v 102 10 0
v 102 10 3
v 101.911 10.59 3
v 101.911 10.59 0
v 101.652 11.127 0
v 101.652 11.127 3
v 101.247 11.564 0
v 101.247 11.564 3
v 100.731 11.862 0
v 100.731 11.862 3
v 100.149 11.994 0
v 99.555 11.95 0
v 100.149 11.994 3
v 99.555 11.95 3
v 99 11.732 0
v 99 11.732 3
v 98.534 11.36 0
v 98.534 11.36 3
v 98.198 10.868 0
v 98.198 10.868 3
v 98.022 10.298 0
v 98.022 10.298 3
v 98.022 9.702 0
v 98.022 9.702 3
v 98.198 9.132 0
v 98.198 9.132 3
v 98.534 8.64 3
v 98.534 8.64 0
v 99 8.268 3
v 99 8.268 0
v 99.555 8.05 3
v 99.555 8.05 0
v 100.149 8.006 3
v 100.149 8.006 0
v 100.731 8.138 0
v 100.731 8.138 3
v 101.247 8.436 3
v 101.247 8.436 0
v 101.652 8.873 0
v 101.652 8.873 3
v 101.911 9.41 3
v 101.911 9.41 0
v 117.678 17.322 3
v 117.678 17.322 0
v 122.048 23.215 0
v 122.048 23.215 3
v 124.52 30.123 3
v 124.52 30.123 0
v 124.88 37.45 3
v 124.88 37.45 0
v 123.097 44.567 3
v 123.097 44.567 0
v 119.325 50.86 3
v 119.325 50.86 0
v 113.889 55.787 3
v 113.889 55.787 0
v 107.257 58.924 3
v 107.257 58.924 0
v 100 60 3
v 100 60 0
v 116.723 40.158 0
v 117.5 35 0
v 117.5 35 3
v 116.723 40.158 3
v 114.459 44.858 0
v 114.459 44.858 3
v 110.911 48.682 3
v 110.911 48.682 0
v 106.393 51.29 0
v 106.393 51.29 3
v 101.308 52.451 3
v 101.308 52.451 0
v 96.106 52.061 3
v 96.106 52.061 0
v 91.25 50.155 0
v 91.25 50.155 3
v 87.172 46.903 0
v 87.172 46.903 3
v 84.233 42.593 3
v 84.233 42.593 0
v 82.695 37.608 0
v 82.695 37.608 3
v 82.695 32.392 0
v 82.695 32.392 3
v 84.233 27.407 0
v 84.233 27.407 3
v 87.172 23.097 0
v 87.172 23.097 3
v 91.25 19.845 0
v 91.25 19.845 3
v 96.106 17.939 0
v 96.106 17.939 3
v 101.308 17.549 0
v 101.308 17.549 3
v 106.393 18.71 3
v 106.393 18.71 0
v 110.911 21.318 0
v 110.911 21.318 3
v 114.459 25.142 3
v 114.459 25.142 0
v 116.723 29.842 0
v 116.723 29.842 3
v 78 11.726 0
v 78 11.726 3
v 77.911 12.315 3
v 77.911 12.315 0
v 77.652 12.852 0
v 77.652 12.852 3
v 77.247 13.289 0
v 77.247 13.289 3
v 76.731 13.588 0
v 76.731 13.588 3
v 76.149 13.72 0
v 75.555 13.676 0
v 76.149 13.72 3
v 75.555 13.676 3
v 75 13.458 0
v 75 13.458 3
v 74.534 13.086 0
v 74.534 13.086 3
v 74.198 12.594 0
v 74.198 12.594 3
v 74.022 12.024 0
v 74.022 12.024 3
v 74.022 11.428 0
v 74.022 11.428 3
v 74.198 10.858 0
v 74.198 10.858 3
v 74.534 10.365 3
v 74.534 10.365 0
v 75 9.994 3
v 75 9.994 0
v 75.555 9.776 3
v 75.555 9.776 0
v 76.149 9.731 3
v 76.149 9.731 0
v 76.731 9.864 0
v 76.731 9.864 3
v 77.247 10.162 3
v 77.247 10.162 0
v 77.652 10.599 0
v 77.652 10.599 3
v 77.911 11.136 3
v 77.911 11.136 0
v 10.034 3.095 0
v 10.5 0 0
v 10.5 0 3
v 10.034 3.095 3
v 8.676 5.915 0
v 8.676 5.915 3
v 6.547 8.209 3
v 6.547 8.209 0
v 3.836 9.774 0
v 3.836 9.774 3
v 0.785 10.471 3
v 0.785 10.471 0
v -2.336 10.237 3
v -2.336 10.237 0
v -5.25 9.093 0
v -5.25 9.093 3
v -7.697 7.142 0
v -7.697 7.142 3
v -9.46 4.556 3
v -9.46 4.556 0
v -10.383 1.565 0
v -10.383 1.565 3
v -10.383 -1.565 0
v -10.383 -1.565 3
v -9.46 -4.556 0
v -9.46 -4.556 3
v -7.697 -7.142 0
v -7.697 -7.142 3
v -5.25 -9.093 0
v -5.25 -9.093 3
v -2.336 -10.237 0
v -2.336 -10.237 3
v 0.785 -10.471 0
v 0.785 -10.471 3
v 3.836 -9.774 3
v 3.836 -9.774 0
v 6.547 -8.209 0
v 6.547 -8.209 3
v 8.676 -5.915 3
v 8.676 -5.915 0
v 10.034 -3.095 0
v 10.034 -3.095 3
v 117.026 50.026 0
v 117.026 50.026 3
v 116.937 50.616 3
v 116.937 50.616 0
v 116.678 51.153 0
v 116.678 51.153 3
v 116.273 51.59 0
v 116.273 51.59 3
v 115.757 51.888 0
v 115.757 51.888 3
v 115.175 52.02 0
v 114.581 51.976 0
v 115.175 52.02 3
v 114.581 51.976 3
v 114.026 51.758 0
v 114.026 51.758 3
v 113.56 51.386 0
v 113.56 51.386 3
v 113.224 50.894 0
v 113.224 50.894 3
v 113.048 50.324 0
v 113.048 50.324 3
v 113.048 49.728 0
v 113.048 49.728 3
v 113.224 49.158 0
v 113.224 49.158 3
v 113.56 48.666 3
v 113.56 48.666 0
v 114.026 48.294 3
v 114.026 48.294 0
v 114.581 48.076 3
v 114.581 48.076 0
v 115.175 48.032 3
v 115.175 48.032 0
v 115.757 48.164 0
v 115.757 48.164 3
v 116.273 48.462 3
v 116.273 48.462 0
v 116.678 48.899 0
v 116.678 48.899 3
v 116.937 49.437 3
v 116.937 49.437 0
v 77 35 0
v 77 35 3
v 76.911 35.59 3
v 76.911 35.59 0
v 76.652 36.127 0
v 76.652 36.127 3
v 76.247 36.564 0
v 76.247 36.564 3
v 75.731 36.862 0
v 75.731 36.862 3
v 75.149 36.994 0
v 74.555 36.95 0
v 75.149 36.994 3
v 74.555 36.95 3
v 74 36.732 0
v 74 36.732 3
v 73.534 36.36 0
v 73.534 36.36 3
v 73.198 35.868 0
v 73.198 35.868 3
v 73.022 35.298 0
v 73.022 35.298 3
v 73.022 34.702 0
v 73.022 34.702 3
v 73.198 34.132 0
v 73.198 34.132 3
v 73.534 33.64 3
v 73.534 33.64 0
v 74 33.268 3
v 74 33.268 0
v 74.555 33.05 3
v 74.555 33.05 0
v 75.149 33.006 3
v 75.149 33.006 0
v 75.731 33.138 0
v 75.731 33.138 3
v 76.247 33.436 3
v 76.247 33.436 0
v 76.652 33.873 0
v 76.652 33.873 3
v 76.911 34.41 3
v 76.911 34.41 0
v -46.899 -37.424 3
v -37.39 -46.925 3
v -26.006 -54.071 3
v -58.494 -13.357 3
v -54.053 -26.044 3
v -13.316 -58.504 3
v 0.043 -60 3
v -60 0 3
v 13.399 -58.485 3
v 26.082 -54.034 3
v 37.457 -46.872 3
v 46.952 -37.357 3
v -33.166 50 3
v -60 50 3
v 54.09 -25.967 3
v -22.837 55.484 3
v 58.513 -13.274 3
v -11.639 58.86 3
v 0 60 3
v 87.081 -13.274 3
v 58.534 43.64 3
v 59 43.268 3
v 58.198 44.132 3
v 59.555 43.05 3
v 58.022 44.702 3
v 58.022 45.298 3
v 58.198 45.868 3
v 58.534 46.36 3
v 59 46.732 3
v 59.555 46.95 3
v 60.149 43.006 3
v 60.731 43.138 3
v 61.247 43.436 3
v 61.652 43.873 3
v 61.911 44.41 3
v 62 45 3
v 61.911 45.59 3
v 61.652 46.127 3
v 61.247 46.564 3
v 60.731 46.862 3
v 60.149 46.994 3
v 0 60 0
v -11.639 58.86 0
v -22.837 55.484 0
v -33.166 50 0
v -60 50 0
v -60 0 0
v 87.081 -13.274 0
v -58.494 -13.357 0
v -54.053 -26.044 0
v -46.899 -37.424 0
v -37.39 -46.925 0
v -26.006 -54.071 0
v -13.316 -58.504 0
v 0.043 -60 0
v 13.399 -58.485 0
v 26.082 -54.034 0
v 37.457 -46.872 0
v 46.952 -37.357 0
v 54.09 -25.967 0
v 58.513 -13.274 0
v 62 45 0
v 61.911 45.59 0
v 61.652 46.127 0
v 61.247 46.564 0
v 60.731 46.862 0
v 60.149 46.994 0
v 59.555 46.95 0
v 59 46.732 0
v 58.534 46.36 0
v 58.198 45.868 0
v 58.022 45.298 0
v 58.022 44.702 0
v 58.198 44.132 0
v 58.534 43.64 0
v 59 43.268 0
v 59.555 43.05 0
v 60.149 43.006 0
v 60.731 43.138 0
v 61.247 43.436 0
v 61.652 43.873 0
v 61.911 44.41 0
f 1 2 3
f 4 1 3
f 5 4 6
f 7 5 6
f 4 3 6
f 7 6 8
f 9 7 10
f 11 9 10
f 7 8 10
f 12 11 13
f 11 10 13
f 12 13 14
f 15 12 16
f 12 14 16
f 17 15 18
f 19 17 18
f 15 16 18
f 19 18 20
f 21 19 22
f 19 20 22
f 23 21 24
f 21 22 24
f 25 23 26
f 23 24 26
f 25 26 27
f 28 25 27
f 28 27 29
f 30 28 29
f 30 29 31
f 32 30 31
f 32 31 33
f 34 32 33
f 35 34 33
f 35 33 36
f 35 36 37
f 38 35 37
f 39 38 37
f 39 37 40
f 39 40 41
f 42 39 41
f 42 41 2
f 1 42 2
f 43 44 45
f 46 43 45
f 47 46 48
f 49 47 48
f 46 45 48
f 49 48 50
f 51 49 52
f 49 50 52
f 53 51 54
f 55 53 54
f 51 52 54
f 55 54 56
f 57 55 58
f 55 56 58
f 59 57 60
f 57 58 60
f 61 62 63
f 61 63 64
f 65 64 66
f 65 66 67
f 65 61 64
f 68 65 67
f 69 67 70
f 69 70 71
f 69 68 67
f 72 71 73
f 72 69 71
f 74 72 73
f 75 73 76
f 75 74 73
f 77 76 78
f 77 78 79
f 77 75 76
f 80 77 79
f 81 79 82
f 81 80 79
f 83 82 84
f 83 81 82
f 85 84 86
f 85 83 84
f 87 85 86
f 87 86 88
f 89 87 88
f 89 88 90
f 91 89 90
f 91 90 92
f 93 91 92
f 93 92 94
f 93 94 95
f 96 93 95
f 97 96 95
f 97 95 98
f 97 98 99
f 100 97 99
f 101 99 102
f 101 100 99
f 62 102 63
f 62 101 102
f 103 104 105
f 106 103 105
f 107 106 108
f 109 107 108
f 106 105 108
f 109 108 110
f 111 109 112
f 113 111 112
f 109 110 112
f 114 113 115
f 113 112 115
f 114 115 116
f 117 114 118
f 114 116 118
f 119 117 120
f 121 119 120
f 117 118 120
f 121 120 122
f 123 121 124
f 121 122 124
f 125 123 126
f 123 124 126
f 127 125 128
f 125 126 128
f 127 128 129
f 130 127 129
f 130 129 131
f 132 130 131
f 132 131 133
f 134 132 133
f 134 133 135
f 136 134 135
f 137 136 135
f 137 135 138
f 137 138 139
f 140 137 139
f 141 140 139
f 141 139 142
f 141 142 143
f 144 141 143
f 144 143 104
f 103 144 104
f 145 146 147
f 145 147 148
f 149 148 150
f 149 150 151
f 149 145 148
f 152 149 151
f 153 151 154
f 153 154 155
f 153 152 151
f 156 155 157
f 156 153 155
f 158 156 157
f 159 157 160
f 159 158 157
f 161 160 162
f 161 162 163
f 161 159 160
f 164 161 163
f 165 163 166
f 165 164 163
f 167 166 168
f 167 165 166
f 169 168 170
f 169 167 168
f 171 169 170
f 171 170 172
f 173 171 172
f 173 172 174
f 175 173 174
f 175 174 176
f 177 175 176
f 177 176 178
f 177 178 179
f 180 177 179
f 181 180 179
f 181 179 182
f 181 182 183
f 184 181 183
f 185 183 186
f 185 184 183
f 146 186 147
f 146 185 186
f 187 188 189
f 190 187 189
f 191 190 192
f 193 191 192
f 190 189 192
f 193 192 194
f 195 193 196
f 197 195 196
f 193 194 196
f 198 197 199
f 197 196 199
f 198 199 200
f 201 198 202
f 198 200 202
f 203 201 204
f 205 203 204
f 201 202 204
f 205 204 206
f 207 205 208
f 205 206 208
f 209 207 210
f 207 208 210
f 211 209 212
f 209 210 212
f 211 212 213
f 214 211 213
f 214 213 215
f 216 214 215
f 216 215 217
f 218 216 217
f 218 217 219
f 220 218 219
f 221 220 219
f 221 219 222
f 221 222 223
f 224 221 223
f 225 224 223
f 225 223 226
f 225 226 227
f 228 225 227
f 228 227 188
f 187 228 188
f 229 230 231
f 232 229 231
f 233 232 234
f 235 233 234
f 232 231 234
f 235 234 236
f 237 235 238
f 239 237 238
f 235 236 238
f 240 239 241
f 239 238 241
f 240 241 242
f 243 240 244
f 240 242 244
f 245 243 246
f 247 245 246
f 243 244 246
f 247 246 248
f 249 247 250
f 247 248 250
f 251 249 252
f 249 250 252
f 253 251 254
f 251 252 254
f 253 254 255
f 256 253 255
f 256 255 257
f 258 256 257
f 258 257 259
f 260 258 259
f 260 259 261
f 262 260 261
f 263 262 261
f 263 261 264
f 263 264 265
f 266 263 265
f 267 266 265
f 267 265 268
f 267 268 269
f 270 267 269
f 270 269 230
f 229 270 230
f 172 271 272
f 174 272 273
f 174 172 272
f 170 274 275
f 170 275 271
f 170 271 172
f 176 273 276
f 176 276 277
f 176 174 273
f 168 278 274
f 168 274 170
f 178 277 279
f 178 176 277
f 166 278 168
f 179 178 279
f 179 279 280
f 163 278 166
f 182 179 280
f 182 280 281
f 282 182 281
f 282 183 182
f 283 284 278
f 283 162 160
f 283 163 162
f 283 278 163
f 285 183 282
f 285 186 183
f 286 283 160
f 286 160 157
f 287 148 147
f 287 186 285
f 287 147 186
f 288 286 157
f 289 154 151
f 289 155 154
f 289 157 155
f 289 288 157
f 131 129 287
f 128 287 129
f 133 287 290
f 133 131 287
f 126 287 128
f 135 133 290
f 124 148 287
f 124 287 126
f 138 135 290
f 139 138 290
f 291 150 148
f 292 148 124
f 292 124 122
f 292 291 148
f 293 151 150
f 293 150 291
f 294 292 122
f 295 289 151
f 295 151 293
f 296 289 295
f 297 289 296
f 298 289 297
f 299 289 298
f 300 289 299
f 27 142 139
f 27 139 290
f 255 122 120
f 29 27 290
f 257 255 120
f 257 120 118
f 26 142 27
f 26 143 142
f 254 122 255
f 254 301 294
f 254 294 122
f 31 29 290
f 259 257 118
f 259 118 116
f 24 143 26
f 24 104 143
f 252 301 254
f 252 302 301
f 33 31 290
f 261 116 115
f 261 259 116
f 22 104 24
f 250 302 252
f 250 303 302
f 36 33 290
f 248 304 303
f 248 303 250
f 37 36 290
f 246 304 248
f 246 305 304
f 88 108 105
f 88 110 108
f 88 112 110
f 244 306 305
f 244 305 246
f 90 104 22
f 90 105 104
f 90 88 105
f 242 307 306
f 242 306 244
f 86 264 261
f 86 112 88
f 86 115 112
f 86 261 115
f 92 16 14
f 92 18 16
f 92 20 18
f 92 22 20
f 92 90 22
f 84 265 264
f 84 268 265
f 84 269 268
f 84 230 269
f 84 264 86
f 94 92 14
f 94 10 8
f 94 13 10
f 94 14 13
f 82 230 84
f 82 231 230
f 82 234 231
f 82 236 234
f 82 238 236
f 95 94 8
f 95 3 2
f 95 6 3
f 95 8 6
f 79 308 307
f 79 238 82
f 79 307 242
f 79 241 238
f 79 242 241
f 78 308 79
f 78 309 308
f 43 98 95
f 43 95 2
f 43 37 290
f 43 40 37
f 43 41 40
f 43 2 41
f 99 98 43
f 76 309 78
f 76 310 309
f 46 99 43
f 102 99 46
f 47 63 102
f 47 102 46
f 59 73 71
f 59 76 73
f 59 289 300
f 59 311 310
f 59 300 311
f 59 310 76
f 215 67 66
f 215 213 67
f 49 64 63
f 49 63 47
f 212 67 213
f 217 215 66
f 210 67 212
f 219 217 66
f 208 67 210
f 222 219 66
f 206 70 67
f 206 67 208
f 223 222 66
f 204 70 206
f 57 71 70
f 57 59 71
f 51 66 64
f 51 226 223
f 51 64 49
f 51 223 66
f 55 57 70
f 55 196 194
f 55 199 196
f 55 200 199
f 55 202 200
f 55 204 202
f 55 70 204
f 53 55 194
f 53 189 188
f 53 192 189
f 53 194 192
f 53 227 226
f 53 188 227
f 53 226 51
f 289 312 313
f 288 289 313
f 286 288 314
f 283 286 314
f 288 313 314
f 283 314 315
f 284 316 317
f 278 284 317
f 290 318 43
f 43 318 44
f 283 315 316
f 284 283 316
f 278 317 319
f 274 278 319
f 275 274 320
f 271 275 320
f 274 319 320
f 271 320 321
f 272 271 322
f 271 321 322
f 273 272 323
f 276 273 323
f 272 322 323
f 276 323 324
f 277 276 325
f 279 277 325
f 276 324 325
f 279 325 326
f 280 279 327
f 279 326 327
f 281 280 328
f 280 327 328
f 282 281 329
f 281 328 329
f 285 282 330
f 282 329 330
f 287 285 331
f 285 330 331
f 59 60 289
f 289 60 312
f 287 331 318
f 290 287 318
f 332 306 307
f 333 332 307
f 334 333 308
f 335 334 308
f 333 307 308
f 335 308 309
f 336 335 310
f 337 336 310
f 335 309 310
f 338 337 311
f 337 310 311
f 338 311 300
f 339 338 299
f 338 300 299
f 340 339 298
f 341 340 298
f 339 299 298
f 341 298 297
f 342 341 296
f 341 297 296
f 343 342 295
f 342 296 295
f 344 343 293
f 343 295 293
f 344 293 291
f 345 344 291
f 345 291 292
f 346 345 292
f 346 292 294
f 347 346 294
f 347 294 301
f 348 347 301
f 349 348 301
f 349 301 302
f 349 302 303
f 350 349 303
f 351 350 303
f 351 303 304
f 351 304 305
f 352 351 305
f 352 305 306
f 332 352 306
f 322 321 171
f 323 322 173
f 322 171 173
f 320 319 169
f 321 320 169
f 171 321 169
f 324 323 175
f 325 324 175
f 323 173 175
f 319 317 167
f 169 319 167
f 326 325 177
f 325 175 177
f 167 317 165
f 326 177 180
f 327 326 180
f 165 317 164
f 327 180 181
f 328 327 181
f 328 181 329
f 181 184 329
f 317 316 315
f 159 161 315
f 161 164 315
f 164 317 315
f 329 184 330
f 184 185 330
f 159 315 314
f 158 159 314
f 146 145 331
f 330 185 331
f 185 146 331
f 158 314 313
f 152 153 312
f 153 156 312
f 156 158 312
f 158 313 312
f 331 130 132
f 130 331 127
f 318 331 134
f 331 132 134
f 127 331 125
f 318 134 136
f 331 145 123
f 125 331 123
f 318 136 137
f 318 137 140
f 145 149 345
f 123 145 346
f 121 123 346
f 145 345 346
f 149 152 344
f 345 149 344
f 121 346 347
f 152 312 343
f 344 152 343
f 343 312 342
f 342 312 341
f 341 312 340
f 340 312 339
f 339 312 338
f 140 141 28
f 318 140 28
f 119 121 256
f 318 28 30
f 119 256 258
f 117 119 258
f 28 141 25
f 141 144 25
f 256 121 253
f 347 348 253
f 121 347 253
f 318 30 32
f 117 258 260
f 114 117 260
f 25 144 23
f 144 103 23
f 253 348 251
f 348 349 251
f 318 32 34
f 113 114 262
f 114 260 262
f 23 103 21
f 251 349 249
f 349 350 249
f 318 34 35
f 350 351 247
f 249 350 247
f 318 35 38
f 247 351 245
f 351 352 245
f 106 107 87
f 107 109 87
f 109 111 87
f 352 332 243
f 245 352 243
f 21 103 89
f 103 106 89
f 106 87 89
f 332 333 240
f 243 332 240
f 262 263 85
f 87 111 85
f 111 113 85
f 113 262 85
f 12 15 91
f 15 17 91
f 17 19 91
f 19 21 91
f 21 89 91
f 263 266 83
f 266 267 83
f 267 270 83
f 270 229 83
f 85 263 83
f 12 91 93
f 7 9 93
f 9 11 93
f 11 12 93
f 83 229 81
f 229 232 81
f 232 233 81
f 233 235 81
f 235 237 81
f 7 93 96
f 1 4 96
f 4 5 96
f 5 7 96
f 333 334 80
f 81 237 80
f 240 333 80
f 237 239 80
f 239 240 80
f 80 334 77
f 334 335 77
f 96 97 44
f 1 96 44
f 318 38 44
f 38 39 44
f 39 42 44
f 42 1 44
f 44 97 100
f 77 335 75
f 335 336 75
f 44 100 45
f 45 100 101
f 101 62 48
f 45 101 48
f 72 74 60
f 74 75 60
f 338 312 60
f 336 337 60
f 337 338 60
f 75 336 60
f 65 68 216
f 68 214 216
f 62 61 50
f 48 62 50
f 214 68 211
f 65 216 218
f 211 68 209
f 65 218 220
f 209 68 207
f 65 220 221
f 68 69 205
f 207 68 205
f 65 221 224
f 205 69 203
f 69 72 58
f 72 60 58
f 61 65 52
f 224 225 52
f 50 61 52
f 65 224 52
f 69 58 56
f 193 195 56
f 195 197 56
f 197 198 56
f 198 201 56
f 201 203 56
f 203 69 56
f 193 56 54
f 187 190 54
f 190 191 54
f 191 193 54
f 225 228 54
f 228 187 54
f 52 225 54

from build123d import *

# Parameters (mm, degrees)
SKETCH1_R           = 10.5
SKETCH1_R_2         = 17.5
BOSS_EXTRUDE1_DEPTH = 3
CUT_EXTRUDE1_REACH  = 140.687
SKETCH2_R           = 2
CUT_EXTRUDE2_REACH  = 140.687
SKETCH3_R           = 2


with BuildPart() as part:
    # Sketch1 → Boss-Extrude1 (new body)
    # profile 1 of 2: a face of its own
    with BuildSketch(Plane.XY):
        with BuildLine():
            ThreePointArc((-60, 0), (-52.867640737, 28.372743309), (-33.166247904, 50))
            Line((-33.166247904, 50), (-60, 50))
            Line((-60, 50), (-60, 0))
        make_face()
    # profile 2 of 2: a face of its own
    with BuildSketch(Plane.XY):
        with BuildLine():
            ThreePointArc((0, 60), (-17.320508076, 57.445626465), (-33.166247904, 50))
            ThreePointArc((-33.166247904, 50), (-52.867640737, 28.372743309), (-60, 0))
            ThreePointArc((-60, 0), (-6.678621673, -59.627141576), (58.513200418, -13.274237334))
            Line((58.513200418, -13.274237334), (87.081101726, -13.274237334))
            Line((87.081101726, -13.274237334), (117.67766953, 17.32233047))
            ThreePointArc((117.67766953, 17.32233047), (123.096988313, 44.567085809), (100, 60))
            Line((100, 60), (0, 60))
        make_face()
        Circle(SKETCH1_R, mode=Mode.SUBTRACT)
        with Locations((100, 35)):
            Circle(SKETCH1_R_2, mode=Mode.SUBTRACT)
    extrude(amount=BOSS_EXTRUDE1_DEPTH)

    # Sketch2 → Cut-Extrude1 (cut, up to next)
    with BuildSketch(Plane.XY.offset(3), mode=Mode.PRIVATE) as cut_extrude1_sk1:
        with Locations((60, 45)):
            Circle(SKETCH2_R)
    cut_extrude1_tool1 = extrude(cut_extrude1_sk1.sketch, amount=-CUT_EXTRUDE1_REACH, mode=Mode.PRIVATE) & part.part
    # Sketch2 → Cut-Extrude1 (cut, up to next)
    with BuildSketch(Plane.XY.offset(3), mode=Mode.PRIVATE) as cut_extrude1_sk2:
        with Locations((76, 11.725762666)):
            Circle(SKETCH2_R)
    cut_extrude1_tool2 = extrude(cut_extrude1_sk2.sketch, amount=-CUT_EXTRUDE1_REACH, mode=Mode.PRIVATE) & part.part
    add(cut_extrude1_tool1.solids().sort_by_distance((60, 45, 3))[0], mode=Mode.SUBTRACT)
    add(cut_extrude1_tool2.solids().sort_by_distance((76, 11.725763, 3))[0], mode=Mode.SUBTRACT)

    # Sketch3 → Cut-Extrude2 (cut, up to next)
    with BuildSketch(Plane.XY.offset(3), mode=Mode.PRIVATE) as cut_extrude2_sk1:
        with Locations((100, 10)):
            Circle(SKETCH3_R)
    cut_extrude2_tool1 = extrude(cut_extrude2_sk1.sketch, amount=-CUT_EXTRUDE2_REACH, mode=Mode.PRIVATE) & part.part
    # Sketch3 → Cut-Extrude2 (cut, up to next)
    with BuildSketch(Plane.XY.offset(3), mode=Mode.PRIVATE) as cut_extrude2_sk2:
        with Locations((75, 35)):
            Circle(SKETCH3_R)
    cut_extrude2_tool2 = extrude(cut_extrude2_sk2.sketch, amount=-CUT_EXTRUDE2_REACH, mode=Mode.PRIVATE) & part.part
    # Sketch3 → Cut-Extrude2 (cut, up to next)
    with BuildSketch(Plane.XY.offset(3), mode=Mode.PRIVATE) as cut_extrude2_sk3:
        with Locations((115.0260191, 50.0260191)):
            Circle(SKETCH3_R)
    cut_extrude2_tool3 = extrude(cut_extrude2_sk3.sketch, amount=-CUT_EXTRUDE2_REACH, mode=Mode.PRIVATE) & part.part
    add(cut_extrude2_tool1.solids().sort_by_distance((100, 10, 3))[0], mode=Mode.SUBTRACT)
    add(cut_extrude2_tool2.solids().sort_by_distance((75, 35, 3))[0], mode=Mode.SUBTRACT)
    add(cut_extrude2_tool3.solids().sort_by_distance((115.026019, 50.026019, 3))[0], mode=Mode.SUBTRACT)


solid = part.part
